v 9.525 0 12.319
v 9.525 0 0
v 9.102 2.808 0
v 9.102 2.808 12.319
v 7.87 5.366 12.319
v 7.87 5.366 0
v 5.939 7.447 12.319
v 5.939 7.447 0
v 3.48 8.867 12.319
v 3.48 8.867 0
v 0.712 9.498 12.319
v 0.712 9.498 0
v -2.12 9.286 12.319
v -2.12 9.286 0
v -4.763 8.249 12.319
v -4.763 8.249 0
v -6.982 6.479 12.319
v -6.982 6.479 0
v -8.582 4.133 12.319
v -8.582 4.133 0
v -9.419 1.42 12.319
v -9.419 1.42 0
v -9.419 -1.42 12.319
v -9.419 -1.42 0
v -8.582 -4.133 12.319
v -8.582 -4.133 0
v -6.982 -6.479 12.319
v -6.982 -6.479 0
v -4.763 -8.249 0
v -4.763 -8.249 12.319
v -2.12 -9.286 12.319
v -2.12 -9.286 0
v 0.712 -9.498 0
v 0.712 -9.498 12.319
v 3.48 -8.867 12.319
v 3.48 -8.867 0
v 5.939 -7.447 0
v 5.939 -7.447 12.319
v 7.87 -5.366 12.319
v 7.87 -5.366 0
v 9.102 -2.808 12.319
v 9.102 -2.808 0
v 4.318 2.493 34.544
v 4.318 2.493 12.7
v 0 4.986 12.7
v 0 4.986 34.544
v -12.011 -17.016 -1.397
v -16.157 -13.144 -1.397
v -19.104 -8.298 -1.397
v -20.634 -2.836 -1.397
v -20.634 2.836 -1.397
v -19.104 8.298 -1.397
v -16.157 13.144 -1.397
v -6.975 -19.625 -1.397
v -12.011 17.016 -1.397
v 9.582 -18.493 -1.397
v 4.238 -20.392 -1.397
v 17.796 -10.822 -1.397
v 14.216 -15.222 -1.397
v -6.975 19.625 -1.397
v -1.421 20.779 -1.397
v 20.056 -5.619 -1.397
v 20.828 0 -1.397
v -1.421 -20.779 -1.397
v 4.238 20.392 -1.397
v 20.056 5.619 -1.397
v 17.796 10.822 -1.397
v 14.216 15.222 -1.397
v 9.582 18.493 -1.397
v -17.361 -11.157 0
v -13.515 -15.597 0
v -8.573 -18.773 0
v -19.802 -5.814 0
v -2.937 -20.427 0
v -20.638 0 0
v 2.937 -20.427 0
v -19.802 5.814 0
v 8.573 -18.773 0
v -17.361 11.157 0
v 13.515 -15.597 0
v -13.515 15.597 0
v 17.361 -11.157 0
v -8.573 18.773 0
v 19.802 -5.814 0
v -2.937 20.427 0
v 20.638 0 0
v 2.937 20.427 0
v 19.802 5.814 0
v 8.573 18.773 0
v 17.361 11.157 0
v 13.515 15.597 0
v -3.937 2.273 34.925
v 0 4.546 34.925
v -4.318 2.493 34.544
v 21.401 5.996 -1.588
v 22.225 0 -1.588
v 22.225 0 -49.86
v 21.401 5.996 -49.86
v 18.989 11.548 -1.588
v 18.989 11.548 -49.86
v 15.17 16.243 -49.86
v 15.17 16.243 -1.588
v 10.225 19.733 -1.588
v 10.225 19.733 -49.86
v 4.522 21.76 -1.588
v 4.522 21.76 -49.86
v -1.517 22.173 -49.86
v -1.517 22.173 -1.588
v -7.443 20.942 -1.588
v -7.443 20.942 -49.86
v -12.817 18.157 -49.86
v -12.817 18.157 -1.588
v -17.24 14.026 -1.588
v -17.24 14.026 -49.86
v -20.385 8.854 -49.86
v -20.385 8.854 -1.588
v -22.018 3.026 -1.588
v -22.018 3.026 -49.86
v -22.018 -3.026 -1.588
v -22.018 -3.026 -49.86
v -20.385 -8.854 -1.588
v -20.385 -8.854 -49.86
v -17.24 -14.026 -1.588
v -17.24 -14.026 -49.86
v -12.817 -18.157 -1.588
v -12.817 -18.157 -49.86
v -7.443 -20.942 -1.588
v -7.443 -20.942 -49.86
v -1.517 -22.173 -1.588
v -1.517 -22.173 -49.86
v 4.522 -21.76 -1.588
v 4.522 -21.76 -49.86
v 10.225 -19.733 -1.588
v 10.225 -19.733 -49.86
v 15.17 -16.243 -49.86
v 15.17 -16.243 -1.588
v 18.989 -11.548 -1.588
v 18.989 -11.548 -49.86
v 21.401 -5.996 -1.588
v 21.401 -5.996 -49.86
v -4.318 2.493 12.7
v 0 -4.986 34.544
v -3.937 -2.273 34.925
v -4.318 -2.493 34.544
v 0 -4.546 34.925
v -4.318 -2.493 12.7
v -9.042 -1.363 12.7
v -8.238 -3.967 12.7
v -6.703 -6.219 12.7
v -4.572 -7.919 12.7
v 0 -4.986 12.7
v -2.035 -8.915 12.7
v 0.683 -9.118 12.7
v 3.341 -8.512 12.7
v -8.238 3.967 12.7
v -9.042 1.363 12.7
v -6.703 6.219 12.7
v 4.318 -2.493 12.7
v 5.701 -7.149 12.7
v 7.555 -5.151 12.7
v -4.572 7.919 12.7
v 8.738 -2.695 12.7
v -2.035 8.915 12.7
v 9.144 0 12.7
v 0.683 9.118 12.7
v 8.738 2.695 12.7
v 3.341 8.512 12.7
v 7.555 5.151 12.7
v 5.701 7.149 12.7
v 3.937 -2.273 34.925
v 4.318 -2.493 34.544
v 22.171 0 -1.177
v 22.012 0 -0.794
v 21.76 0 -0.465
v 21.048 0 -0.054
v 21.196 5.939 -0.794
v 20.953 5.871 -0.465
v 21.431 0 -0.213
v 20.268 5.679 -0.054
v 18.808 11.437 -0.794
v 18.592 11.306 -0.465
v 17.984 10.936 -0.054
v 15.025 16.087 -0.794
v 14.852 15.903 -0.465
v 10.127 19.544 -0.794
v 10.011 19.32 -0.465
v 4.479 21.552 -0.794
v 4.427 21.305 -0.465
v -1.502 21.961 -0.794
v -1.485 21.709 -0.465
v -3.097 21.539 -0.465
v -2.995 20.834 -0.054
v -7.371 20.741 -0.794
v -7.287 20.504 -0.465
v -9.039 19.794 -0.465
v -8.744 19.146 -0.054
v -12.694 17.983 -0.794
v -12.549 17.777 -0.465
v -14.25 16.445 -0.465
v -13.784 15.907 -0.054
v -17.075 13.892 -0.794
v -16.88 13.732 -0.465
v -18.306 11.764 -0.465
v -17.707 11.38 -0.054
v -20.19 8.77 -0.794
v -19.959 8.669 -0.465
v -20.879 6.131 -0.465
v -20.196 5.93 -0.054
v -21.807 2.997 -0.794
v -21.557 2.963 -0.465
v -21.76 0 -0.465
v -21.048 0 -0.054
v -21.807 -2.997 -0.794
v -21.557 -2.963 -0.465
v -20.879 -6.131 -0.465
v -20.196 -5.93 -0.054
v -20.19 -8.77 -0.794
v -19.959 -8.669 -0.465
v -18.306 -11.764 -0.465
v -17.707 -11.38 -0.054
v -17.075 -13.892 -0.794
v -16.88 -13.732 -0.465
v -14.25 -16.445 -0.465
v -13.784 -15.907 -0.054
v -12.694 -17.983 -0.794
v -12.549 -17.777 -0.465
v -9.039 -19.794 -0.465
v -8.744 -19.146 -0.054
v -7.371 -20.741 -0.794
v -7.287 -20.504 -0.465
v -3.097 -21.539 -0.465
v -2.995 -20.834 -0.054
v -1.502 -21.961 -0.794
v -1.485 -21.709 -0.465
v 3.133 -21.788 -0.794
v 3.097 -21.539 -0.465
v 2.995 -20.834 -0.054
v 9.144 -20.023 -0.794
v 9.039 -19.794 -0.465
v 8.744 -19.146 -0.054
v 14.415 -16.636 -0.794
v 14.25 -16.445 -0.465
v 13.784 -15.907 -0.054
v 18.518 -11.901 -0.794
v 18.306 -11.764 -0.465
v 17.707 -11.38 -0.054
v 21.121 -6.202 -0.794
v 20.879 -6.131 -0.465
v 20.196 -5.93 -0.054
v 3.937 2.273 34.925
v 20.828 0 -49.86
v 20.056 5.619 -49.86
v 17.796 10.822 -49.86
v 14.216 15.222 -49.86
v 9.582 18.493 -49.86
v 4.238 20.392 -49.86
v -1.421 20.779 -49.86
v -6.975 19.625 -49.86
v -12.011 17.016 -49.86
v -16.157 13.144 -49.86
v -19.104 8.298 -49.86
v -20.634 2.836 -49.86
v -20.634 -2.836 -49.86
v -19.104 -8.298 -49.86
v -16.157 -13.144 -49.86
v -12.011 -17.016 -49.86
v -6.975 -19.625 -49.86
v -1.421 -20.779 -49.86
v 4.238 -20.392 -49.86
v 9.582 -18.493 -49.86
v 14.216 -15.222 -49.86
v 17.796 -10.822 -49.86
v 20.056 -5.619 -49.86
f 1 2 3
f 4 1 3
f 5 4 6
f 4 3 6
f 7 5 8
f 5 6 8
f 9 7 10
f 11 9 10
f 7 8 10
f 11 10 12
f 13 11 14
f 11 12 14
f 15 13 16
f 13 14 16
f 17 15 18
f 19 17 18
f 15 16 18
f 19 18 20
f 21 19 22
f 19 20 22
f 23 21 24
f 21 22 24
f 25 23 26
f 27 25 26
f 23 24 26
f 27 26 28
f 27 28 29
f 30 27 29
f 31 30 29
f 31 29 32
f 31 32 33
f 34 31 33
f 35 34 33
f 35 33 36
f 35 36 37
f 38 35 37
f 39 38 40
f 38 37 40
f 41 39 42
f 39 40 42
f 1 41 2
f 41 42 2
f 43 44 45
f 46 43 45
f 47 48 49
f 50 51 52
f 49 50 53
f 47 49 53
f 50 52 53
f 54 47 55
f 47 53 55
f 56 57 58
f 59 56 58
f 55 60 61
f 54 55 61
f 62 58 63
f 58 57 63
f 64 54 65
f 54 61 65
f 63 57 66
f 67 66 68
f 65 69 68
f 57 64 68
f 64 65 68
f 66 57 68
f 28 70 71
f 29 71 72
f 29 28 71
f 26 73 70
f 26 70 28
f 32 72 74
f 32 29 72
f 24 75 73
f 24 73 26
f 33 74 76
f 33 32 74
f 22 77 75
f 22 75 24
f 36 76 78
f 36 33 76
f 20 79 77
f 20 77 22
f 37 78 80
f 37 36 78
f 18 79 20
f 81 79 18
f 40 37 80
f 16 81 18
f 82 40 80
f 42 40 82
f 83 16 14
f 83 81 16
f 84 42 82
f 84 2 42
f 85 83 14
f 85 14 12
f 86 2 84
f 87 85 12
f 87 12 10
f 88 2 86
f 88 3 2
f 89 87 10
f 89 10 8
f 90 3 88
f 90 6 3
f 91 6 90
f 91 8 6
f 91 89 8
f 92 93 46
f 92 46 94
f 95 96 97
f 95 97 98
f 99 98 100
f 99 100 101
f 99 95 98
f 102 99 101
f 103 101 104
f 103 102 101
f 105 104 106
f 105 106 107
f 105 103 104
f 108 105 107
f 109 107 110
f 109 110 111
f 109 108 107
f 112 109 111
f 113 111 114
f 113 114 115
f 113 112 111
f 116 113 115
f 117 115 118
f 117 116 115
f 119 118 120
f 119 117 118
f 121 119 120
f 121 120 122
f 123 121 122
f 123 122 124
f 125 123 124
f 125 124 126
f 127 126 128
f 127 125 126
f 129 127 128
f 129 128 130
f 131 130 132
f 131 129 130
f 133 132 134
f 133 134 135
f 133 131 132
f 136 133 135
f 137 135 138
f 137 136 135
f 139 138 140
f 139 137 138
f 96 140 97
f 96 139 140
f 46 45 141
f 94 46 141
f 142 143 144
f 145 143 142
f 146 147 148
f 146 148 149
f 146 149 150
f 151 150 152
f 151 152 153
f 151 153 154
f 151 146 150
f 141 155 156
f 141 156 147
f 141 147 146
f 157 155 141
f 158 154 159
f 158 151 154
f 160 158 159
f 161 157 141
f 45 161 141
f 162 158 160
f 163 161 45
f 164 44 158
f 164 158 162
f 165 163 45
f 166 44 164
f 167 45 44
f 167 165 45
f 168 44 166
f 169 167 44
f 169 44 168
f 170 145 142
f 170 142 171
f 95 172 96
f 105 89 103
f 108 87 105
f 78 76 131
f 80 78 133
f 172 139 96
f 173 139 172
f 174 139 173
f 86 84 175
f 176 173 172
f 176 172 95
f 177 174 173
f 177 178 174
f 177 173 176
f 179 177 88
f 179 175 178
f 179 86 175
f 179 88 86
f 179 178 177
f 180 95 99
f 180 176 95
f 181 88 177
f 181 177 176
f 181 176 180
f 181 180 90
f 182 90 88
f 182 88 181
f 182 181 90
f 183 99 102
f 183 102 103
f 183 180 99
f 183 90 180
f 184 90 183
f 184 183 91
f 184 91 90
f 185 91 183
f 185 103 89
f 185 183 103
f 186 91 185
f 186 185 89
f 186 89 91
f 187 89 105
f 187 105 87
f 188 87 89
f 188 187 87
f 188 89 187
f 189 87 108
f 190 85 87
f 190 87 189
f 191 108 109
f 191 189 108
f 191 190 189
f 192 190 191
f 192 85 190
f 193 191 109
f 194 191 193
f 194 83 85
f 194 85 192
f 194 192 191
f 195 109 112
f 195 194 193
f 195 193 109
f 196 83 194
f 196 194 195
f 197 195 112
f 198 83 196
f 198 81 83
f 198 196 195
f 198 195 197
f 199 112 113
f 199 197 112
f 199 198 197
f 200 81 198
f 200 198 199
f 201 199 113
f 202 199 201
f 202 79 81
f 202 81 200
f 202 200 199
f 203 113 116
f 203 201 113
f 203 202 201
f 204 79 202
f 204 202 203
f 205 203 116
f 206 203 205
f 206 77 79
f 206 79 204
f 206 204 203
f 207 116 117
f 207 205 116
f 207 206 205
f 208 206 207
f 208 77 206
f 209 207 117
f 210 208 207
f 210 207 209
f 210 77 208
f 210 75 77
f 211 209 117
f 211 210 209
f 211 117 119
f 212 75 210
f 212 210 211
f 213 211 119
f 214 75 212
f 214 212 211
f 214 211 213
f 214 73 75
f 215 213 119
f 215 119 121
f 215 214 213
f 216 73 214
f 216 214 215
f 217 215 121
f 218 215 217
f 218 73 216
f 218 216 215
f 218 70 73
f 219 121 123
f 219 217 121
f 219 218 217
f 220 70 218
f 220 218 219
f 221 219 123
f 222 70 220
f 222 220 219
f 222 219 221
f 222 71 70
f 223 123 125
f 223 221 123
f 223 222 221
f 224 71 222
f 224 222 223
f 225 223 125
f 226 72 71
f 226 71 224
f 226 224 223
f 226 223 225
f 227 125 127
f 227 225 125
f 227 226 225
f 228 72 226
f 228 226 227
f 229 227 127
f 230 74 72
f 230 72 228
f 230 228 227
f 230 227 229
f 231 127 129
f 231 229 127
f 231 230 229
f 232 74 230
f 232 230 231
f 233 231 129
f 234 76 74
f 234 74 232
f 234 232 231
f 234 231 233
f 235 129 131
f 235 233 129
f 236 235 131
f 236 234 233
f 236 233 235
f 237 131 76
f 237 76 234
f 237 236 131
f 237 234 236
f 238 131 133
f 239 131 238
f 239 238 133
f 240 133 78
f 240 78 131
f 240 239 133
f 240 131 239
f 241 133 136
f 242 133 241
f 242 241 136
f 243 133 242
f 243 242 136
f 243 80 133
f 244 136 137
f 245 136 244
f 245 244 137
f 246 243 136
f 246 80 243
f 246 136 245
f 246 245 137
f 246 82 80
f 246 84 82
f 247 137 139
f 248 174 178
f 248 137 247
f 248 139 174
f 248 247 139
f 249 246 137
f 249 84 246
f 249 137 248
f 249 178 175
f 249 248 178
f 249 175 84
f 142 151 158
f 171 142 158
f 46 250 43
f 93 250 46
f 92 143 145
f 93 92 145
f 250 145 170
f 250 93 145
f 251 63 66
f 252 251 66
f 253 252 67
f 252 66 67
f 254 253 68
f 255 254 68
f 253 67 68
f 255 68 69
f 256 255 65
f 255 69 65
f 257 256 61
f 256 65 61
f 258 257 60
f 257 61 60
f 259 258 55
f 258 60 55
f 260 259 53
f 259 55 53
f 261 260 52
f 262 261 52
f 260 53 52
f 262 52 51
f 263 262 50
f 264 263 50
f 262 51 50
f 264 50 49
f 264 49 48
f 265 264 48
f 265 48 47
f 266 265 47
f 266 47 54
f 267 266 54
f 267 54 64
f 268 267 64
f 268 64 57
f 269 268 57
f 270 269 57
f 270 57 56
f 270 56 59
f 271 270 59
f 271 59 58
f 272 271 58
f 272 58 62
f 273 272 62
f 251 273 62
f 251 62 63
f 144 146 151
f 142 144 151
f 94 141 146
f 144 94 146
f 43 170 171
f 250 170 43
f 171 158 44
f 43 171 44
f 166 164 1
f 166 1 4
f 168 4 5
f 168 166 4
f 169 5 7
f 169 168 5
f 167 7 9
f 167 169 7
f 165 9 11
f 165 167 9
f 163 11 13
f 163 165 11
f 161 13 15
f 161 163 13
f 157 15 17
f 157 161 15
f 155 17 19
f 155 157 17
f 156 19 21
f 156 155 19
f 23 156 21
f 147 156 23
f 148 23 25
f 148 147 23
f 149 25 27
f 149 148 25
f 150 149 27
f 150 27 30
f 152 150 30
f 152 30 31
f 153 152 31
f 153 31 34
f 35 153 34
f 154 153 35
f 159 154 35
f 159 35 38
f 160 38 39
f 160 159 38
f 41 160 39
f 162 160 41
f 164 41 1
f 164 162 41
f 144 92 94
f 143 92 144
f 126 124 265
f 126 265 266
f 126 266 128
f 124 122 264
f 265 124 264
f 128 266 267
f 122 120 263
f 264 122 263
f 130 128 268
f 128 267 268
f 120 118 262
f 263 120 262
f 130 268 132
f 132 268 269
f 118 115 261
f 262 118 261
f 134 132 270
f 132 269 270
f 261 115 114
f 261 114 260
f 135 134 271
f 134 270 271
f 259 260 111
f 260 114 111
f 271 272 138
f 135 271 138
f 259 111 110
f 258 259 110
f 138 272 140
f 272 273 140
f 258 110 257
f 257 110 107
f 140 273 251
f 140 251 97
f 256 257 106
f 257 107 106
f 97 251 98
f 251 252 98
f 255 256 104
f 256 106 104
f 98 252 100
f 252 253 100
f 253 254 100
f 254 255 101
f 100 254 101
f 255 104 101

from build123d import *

# Parameters (mm, degrees)
F0_R     = 22.225
F0_R_2   = 9.525
F1_DEPTH = 49.8602
F2_T     = -1.397
F3_R     = 1.5875
F4_DEPTH = 34.925
F5_DEPTH = 12.7
F6_SIZE  = 0.381


with BuildPart() as f1:
    # F0 (on Top) → F1 (new body)
    with BuildSketch(Plane.XY):
        Circle(F0_R)
        Circle(F0_R_2, mode=Mode.SUBTRACT)
        Circle(F0_R_2)
        Polygon((-4.318, 2.4929984624), (0, 4.9859969247), (4.318, 2.4929984624), (4.318, -2.4929984624), (0, -4.9859969247), (-4.318, -2.4929984624), align=None, mode=Mode.SUBTRACT)
        Polygon((4.318, 2.4929984624), (0, 4.9859969247), (-4.318, 2.4929984624), (-4.318, -2.4929984624), (0, -4.9859969247), (4.318, -2.4929984624), align=None)
    extrude(amount=-F1_DEPTH)

    # F2
    f2_openings = [f1.faces().sort_by_distance(p)[0] for p in [
        (0, 0, -49.8602),
    ]]
    offset(amount=F2_T, openings=f2_openings)

    # F3
    f3_edges = [f1.edges().sort_by_distance(p)[0] for p in [
        (-22.225, 0, 0),
    ]]
    fillet(f3_edges, radius=F3_R)

    # F0 (on Top) → F4 (join)
    with BuildSketch(Plane.XY):
        Polygon((4.318, 2.4929984624), (0, 4.9859969247), (-4.318, 2.4929984624), (-4.318, -2.4929984624), (0, -4.9859969247), (4.318, -2.4929984624), align=None)
    extrude(amount=F4_DEPTH)

    # F0 (on Top) → F5 (join)
    with BuildSketch(Plane.XY):
        Circle(F0_R_2)
        Polygon((-4.318, 2.4929984624), (0, 4.9859969247), (4.318, 2.4929984624), (4.318, -2.4929984624), (0, -4.9859969247), (-4.318, -2.4929984624), align=None, mode=Mode.SUBTRACT)
    extrude(amount=F5_DEPTH)

    # F6
    f6_edges = [f1.edges().sort_by_distance(p)[0] for p in [
        (4.318, 0, 34.925),
        (2.159, 3.739498, 34.925),
        (-2.159, 3.739498, 34.925),
        (-4.318, 0, 34.925),
        (-2.159, -3.739498, 34.925),
        (2.159, -3.739498, 34.925),
        (-9.525, 0, 12.7),
    ]]
    chamfer(f6_edges, length=F6_SIZE)


solid = f1.part
